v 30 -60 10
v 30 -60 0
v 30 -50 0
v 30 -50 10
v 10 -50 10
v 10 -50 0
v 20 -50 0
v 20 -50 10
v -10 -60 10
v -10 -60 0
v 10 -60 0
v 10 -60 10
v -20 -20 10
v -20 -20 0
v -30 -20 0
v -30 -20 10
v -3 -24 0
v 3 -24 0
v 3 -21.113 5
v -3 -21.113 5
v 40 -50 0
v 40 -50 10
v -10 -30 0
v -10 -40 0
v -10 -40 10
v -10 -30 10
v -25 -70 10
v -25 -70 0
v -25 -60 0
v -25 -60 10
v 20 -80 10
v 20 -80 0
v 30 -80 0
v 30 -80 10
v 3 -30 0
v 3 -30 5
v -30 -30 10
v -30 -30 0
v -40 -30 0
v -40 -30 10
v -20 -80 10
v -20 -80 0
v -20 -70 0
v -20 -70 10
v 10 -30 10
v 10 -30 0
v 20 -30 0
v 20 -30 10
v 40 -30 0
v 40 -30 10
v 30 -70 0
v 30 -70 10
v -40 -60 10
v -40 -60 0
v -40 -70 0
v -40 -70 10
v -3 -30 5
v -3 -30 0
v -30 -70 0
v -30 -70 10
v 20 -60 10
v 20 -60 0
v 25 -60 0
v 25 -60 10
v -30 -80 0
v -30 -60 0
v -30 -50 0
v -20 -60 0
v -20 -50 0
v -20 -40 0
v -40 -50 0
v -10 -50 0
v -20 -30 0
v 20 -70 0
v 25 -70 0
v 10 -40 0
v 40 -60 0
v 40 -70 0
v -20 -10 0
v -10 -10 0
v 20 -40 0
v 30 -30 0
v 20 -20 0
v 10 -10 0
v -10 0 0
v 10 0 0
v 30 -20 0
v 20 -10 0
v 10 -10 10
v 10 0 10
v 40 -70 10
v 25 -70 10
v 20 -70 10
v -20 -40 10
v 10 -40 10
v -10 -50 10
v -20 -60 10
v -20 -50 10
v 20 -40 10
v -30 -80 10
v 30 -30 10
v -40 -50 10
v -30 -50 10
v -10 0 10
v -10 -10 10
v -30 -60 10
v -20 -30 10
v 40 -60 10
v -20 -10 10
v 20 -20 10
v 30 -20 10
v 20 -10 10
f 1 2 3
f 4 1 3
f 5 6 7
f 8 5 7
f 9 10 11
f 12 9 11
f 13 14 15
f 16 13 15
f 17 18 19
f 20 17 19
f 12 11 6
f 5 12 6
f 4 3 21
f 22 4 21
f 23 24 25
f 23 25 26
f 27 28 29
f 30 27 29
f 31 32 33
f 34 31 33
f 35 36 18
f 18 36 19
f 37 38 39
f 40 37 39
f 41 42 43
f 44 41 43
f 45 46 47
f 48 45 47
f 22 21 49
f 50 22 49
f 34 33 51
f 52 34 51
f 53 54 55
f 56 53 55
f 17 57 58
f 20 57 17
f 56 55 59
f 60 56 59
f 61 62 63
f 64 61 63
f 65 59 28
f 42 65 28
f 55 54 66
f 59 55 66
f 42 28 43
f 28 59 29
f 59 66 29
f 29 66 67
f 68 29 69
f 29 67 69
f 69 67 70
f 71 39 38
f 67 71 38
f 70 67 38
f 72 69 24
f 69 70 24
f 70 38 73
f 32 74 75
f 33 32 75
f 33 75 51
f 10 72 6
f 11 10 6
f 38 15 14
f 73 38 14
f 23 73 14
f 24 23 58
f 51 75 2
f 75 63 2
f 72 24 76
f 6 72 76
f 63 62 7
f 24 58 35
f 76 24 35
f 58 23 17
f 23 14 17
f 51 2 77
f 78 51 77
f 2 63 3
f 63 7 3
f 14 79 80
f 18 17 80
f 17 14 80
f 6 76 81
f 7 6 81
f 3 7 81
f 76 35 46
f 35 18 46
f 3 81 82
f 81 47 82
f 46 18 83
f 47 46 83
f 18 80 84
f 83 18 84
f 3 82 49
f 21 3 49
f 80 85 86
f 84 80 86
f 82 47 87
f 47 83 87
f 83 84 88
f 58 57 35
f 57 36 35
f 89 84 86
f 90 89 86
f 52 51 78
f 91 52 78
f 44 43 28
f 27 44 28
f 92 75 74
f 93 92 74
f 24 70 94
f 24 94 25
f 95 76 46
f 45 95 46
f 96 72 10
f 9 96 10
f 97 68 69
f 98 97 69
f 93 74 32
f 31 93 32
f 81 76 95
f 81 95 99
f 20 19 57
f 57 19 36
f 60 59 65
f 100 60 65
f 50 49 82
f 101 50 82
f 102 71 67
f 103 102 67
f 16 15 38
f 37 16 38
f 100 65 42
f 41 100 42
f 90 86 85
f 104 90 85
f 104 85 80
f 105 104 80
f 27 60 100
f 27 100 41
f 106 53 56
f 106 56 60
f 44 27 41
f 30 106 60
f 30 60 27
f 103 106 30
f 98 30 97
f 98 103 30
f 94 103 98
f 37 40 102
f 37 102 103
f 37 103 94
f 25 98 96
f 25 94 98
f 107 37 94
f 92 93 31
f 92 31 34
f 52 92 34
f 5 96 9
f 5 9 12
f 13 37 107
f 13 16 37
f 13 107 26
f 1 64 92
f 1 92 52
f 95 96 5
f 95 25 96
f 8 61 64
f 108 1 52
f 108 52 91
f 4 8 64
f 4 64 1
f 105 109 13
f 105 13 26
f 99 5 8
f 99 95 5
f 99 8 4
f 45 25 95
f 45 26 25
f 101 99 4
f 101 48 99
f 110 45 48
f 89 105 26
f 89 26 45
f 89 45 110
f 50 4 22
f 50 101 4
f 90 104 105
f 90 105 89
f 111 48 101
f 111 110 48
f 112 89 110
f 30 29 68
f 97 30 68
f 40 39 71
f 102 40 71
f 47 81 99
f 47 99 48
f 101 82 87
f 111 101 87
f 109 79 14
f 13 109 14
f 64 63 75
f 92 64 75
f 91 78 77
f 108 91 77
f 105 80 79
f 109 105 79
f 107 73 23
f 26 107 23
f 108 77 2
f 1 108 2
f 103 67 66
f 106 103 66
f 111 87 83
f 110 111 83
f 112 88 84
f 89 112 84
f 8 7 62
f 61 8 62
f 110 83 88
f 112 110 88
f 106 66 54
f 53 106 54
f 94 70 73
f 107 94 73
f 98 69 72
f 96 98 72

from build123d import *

# Parameters (mm, degrees)
F0_W     = 10
F0_H     = 10
F0_R     = 6
F1_DEPTH = 10
F3_DEPTH = 3


with BuildPart() as f1:
    # F0 (on Top) → F1 (new body)
    with BuildSketch(Plane.XY):
        Polygon((10, 0), (0, 0), (-10, 0), (-10, -10), (-20, -10), (-20, -20), (-30, -20), (-30, -30), (-40, -30), (-40, -40), (-40, -50), (-30, -50), (-30, -60), (-40, -60), (-40, -70), (-30, -70), (-30, -80), (-20, -80), (-20, -70), (-25, -70), (-25, -60), (-20, -60), (-20, -50), (-10, -50), (-10, -60), (0, -60), (10, -60), (10, -50), (20, -50), (20, -60), (25, -60), (25, -70), (20, -70), (20, -80), (30, -80), (30, -70), (40, -70), (40, -60), (30, -60), (30, -50), (40, -50), (40, -40), (40, -30), (30, -30), (30, -20), (20, -20), (20, -10), (10, -10), align=None)
        with Locations((-15, -35)):
            Rectangle(F0_W, F0_H, mode=Mode.SUBTRACT)
        with Locations((15, -35)):
            Rectangle(F0_W, F0_H, mode=Mode.SUBTRACT)
        with Locations((0, -15)):
            Circle(F0_R, mode=Mode.SUBTRACT)
        with Locations((0, -15)):
            Circle(F0_R)
    extrude(amount=F1_DEPTH)

    # F2 (on Right) → F3 (cut, symmetric)
    with BuildSketch(Plane.YZ):
        Polygon((-30, 5), (-30, 0), (-24, 0), (-21.1132486541, 5), align=None)
    extrude(amount=F3_DEPTH, both=True, mode=Mode.SUBTRACT)


solid = f1.part
